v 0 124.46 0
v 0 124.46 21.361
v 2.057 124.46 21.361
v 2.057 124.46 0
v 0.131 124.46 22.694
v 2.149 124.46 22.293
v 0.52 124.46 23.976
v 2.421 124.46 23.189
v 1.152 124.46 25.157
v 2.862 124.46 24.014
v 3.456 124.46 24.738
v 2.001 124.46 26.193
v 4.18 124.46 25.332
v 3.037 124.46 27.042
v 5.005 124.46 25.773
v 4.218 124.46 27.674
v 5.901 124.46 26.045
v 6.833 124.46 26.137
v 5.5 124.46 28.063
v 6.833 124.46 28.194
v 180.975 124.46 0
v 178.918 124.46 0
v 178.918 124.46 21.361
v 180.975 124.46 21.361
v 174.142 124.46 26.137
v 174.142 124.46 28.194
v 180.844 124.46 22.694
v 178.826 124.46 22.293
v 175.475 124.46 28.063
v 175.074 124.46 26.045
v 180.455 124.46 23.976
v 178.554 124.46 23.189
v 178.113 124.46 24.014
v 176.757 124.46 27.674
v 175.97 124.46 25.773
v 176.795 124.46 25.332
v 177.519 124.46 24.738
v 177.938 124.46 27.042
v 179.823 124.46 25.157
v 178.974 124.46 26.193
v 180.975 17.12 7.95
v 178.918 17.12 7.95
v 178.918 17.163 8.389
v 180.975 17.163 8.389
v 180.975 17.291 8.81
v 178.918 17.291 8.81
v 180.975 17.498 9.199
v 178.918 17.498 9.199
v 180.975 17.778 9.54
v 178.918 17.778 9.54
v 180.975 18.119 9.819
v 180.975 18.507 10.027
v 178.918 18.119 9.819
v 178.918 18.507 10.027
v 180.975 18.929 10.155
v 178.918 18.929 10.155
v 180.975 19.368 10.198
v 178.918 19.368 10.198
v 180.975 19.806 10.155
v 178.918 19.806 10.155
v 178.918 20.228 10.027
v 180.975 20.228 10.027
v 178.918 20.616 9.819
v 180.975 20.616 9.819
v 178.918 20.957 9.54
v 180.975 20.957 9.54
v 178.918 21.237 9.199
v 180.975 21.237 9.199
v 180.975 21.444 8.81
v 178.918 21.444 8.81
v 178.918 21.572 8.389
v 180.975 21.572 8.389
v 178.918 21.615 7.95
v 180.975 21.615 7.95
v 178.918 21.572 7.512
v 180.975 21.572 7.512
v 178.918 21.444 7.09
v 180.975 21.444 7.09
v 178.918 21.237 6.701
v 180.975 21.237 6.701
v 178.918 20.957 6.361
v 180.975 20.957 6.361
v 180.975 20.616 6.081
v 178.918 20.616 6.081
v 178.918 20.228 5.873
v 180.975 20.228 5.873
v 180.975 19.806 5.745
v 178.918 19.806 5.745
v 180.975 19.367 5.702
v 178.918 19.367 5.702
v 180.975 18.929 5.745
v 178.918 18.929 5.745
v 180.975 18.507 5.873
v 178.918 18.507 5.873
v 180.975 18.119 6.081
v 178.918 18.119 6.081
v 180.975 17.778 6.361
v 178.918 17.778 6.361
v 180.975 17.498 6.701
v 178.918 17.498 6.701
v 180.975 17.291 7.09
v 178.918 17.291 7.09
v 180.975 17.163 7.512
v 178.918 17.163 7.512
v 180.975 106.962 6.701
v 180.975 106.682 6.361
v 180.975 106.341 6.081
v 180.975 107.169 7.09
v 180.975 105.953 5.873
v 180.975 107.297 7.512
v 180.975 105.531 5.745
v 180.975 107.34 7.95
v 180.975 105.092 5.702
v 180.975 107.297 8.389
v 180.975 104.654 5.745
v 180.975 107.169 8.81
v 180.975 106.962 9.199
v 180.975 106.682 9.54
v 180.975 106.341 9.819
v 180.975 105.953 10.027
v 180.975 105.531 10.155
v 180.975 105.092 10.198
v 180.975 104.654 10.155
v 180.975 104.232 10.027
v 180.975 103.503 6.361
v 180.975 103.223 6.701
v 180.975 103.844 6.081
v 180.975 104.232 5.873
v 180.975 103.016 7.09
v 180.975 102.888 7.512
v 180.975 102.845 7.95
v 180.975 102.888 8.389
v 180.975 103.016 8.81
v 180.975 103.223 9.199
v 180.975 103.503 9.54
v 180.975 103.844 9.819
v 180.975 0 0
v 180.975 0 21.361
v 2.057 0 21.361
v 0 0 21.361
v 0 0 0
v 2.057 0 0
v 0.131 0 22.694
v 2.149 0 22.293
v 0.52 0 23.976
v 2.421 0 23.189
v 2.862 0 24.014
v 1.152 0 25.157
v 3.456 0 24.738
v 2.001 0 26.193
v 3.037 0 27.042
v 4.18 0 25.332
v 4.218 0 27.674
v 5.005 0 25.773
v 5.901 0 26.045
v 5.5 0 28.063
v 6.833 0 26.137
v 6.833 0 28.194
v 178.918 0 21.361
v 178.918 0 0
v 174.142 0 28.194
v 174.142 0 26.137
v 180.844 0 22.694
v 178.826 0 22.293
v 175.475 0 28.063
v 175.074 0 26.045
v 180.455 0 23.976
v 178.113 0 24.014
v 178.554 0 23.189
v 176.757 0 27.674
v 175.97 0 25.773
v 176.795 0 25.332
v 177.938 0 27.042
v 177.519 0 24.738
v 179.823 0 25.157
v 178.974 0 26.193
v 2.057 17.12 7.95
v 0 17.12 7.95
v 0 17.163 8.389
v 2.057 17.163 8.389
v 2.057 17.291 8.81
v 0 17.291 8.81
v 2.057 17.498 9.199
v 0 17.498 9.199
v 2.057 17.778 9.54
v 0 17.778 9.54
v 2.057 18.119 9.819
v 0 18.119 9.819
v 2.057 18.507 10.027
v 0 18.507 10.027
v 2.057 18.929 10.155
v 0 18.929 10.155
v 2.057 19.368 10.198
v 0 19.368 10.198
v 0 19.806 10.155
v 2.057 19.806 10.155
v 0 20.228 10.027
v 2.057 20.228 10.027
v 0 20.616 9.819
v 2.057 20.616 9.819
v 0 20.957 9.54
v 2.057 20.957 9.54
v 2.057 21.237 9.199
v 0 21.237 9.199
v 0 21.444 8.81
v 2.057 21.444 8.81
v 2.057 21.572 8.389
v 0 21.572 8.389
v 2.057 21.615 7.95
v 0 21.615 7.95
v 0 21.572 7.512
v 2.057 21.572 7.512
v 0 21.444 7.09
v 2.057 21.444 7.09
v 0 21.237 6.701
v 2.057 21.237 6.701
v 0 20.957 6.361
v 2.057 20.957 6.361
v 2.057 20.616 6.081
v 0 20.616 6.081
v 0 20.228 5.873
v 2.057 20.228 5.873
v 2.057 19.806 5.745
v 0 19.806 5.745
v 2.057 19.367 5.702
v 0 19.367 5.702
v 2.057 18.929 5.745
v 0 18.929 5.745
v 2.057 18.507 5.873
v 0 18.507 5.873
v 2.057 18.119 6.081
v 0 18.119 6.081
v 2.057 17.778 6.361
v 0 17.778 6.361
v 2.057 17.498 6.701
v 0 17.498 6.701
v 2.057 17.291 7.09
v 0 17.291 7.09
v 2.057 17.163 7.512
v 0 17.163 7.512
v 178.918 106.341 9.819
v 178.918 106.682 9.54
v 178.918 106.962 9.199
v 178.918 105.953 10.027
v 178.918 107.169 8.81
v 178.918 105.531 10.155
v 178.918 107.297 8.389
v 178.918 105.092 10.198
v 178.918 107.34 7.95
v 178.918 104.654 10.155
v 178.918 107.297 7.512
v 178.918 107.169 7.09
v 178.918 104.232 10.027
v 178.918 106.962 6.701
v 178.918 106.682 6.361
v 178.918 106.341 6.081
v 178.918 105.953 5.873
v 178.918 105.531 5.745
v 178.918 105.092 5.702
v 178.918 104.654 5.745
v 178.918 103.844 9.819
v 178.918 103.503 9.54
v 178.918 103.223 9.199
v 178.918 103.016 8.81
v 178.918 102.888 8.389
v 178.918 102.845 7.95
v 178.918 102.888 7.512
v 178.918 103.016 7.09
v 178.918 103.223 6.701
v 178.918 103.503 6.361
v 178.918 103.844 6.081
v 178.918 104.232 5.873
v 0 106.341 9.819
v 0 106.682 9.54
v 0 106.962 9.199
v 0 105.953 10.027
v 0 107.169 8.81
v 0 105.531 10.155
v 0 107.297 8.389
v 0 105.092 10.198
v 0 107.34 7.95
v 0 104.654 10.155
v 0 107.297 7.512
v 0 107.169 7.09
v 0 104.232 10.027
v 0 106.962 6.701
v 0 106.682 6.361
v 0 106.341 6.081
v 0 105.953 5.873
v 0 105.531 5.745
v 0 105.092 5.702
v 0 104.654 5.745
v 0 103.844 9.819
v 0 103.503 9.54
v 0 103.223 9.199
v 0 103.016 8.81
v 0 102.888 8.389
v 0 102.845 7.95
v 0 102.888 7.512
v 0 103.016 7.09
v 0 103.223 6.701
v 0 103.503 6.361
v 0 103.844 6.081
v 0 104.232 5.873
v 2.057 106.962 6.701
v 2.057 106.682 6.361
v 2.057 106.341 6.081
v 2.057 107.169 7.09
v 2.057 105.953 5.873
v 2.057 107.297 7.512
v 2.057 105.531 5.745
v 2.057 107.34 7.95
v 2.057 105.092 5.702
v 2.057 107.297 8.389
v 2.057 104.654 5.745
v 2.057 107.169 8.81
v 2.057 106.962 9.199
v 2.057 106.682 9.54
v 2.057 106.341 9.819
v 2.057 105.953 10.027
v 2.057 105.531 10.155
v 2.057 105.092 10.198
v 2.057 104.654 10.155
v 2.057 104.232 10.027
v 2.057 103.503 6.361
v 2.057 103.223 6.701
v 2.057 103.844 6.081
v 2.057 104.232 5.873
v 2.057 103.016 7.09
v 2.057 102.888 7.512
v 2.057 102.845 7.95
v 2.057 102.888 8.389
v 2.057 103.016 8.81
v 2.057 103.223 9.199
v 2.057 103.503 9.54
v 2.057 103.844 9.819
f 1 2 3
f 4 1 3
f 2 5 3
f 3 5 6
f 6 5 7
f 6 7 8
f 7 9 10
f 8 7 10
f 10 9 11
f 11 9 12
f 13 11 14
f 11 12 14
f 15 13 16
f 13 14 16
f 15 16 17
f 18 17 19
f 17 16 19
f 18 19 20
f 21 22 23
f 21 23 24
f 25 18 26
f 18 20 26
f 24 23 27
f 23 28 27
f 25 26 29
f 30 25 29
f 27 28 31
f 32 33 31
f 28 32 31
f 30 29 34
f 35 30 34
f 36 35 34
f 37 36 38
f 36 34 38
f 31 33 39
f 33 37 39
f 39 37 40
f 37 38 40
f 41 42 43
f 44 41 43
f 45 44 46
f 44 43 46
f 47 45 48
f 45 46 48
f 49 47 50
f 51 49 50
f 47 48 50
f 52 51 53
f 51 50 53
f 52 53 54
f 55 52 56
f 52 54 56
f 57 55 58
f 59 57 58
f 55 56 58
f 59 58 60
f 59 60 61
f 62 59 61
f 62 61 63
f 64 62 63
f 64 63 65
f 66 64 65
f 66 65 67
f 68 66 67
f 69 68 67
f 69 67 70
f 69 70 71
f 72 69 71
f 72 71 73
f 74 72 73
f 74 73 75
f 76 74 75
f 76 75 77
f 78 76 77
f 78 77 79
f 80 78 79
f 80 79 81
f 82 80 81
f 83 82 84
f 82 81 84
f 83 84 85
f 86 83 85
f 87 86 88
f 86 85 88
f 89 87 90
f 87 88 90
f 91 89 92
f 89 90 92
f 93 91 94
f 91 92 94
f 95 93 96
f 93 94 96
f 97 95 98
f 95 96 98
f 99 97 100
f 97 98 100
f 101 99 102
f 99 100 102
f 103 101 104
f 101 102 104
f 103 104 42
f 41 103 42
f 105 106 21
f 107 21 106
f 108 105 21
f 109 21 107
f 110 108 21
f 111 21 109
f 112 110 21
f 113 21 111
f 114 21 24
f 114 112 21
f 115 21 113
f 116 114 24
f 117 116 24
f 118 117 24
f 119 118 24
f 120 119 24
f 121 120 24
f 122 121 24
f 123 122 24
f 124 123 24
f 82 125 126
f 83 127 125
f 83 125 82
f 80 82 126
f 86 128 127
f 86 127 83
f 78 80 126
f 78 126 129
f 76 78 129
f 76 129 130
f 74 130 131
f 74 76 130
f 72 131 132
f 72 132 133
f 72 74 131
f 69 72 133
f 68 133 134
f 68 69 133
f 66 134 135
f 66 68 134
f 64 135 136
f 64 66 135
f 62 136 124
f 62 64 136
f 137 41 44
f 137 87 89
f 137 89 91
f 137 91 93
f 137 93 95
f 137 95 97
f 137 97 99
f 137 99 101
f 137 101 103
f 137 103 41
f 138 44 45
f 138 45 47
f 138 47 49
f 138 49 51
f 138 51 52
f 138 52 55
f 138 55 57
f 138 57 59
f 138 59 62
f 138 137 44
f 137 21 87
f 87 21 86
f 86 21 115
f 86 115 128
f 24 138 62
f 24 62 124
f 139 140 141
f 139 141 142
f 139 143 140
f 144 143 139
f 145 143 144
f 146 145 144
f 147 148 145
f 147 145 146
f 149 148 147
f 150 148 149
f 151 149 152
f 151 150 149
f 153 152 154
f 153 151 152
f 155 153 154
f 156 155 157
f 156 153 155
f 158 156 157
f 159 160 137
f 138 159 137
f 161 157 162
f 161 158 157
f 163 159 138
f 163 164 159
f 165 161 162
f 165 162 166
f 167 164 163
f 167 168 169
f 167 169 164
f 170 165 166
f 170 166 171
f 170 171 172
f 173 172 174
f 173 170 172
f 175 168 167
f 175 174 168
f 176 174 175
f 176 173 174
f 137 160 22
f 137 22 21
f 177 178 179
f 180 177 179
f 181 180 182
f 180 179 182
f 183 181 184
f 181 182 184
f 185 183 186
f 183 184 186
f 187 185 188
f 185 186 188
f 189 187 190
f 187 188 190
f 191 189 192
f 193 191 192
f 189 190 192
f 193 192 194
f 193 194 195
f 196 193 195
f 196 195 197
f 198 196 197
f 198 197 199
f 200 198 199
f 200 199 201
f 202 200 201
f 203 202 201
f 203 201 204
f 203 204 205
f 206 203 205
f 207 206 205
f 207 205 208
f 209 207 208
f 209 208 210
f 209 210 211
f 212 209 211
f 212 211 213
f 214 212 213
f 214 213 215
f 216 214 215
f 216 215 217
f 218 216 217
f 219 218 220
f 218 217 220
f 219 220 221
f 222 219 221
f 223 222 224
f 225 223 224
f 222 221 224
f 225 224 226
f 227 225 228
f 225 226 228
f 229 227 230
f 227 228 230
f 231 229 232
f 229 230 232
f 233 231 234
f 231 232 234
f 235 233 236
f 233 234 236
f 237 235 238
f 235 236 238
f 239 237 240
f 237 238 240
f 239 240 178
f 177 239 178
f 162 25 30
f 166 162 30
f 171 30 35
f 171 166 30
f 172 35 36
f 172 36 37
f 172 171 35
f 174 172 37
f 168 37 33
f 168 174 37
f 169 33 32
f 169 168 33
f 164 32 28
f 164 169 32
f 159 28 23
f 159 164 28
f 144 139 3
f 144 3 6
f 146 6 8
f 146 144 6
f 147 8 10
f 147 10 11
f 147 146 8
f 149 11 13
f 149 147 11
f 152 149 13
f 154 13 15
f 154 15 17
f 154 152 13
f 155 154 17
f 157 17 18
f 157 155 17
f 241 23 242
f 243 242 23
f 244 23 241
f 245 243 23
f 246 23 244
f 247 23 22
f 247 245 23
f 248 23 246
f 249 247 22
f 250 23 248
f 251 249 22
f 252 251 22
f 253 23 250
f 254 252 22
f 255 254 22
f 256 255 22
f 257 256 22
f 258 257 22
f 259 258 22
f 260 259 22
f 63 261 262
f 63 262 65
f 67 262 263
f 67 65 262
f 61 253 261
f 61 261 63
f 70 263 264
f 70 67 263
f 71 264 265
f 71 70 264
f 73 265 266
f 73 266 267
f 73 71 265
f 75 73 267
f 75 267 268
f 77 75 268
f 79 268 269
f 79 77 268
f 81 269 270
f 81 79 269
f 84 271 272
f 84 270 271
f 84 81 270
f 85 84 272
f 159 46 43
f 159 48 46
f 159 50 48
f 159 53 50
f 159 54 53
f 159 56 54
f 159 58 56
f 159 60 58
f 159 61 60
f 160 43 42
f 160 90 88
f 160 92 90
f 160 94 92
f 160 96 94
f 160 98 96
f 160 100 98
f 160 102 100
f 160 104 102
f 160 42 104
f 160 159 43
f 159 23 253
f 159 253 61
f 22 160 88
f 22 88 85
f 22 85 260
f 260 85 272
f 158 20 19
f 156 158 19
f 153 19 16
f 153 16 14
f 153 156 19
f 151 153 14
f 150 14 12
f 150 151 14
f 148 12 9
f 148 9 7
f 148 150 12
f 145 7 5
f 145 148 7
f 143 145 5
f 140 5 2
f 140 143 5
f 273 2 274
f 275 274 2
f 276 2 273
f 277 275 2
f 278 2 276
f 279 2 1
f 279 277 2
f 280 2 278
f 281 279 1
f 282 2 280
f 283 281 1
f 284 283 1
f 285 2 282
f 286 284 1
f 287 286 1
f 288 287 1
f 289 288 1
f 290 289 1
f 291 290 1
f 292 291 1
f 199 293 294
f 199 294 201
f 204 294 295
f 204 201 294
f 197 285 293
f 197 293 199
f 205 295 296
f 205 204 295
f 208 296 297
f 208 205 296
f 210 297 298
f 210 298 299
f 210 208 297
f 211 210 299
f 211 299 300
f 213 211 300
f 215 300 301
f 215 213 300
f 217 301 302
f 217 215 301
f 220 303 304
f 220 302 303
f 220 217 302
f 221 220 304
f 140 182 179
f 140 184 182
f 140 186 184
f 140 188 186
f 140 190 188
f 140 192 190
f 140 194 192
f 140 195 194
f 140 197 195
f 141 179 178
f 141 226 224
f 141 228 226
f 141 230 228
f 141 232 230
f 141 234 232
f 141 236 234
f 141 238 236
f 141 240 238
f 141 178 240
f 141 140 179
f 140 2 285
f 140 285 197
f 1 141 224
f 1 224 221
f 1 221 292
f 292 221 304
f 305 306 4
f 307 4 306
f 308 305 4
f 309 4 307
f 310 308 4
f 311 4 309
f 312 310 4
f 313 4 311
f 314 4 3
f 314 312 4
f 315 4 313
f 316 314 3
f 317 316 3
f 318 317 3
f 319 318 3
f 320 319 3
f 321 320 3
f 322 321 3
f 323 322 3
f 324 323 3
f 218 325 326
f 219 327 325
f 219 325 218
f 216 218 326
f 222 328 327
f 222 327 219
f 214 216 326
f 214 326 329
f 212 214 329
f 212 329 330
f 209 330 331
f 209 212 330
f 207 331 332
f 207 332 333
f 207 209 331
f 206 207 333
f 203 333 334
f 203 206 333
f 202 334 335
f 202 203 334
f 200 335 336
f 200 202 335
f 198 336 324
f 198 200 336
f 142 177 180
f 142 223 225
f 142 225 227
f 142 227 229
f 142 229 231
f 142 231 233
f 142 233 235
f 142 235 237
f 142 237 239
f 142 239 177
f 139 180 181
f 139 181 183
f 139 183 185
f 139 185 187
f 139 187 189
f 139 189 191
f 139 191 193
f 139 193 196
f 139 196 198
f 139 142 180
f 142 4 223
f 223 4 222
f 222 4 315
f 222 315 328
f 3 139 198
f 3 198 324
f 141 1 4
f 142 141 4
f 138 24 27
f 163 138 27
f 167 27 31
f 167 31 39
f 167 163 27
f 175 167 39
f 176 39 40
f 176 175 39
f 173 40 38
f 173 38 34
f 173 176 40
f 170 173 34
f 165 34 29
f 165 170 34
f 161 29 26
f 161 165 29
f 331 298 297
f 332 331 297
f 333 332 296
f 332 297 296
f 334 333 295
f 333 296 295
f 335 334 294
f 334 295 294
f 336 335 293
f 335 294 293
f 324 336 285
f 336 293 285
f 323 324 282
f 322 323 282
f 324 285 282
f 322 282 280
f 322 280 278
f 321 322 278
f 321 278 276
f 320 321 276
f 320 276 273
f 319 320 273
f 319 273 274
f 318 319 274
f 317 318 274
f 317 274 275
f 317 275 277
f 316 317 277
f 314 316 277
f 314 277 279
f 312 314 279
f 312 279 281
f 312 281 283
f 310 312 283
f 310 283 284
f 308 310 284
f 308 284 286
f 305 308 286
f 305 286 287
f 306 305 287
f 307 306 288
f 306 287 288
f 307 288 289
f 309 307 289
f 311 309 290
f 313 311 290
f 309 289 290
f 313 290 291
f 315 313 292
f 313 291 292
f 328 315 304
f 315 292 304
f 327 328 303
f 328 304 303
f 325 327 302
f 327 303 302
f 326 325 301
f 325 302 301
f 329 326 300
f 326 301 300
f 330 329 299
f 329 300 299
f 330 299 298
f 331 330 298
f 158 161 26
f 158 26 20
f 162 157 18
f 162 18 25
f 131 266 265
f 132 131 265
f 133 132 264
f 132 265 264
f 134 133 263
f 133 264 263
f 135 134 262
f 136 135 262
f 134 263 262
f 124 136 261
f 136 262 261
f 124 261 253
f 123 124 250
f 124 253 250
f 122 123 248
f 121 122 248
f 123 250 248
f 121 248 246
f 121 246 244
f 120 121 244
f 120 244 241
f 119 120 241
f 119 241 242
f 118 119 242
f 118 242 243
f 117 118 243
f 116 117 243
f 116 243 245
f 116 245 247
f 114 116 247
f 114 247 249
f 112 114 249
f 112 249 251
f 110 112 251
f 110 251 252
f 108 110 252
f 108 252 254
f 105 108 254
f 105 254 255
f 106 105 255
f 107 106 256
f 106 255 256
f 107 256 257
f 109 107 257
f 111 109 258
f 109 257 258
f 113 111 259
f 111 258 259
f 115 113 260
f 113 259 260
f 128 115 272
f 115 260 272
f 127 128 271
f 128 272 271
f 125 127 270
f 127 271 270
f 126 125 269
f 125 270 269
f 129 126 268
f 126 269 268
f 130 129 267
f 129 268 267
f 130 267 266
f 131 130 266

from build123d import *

# Parameters (mm, degrees)
F1_DEPTH = 124.46
F3_D     = 4.4958


with BuildPart() as f1:
    # F0 (on Front) → F1 (new body)
    with BuildSketch(Plane.XZ):
        with BuildLine():
            Line((0, 21.3614), (0, 0))
            Line((0, 0), (2.0574, 0))
            Line((2.0574, 0), (2.0574, 21.3614))
            ThreePointArc((2.0574, 21.3614), (3.456024, 24.737976), (6.8326, 26.1366))
            Line((6.8326, 26.1366), (174.1424, 26.1366))
            ThreePointArc((174.1424, 26.1366), (177.518976, 24.737976), (178.9176, 21.3614))
            Line((178.9176, 21.3614), (178.9176, 0))
            Line((178.9176, 0), (180.975, 0))
            Line((180.975, 0), (180.975, 21.3614))
            ThreePointArc((180.975, 21.3614), (178.973778, 26.192778), (174.1424, 28.194))
            Line((174.1424, 28.194), (6.8326, 28.194))
            ThreePointArc((6.8326, 28.194), (2.001222, 26.192778), (0, 21.3614))
        make_face()
    extrude(amount=-F1_DEPTH)

    # F3 (through all)
    with Locations(Plane.YZ.offset(180.975)):
        with Locations((19.3675, 7.9502), (105.0925, 7.9502)):
            Hole(F3_D / 2)


solid = f1.part
